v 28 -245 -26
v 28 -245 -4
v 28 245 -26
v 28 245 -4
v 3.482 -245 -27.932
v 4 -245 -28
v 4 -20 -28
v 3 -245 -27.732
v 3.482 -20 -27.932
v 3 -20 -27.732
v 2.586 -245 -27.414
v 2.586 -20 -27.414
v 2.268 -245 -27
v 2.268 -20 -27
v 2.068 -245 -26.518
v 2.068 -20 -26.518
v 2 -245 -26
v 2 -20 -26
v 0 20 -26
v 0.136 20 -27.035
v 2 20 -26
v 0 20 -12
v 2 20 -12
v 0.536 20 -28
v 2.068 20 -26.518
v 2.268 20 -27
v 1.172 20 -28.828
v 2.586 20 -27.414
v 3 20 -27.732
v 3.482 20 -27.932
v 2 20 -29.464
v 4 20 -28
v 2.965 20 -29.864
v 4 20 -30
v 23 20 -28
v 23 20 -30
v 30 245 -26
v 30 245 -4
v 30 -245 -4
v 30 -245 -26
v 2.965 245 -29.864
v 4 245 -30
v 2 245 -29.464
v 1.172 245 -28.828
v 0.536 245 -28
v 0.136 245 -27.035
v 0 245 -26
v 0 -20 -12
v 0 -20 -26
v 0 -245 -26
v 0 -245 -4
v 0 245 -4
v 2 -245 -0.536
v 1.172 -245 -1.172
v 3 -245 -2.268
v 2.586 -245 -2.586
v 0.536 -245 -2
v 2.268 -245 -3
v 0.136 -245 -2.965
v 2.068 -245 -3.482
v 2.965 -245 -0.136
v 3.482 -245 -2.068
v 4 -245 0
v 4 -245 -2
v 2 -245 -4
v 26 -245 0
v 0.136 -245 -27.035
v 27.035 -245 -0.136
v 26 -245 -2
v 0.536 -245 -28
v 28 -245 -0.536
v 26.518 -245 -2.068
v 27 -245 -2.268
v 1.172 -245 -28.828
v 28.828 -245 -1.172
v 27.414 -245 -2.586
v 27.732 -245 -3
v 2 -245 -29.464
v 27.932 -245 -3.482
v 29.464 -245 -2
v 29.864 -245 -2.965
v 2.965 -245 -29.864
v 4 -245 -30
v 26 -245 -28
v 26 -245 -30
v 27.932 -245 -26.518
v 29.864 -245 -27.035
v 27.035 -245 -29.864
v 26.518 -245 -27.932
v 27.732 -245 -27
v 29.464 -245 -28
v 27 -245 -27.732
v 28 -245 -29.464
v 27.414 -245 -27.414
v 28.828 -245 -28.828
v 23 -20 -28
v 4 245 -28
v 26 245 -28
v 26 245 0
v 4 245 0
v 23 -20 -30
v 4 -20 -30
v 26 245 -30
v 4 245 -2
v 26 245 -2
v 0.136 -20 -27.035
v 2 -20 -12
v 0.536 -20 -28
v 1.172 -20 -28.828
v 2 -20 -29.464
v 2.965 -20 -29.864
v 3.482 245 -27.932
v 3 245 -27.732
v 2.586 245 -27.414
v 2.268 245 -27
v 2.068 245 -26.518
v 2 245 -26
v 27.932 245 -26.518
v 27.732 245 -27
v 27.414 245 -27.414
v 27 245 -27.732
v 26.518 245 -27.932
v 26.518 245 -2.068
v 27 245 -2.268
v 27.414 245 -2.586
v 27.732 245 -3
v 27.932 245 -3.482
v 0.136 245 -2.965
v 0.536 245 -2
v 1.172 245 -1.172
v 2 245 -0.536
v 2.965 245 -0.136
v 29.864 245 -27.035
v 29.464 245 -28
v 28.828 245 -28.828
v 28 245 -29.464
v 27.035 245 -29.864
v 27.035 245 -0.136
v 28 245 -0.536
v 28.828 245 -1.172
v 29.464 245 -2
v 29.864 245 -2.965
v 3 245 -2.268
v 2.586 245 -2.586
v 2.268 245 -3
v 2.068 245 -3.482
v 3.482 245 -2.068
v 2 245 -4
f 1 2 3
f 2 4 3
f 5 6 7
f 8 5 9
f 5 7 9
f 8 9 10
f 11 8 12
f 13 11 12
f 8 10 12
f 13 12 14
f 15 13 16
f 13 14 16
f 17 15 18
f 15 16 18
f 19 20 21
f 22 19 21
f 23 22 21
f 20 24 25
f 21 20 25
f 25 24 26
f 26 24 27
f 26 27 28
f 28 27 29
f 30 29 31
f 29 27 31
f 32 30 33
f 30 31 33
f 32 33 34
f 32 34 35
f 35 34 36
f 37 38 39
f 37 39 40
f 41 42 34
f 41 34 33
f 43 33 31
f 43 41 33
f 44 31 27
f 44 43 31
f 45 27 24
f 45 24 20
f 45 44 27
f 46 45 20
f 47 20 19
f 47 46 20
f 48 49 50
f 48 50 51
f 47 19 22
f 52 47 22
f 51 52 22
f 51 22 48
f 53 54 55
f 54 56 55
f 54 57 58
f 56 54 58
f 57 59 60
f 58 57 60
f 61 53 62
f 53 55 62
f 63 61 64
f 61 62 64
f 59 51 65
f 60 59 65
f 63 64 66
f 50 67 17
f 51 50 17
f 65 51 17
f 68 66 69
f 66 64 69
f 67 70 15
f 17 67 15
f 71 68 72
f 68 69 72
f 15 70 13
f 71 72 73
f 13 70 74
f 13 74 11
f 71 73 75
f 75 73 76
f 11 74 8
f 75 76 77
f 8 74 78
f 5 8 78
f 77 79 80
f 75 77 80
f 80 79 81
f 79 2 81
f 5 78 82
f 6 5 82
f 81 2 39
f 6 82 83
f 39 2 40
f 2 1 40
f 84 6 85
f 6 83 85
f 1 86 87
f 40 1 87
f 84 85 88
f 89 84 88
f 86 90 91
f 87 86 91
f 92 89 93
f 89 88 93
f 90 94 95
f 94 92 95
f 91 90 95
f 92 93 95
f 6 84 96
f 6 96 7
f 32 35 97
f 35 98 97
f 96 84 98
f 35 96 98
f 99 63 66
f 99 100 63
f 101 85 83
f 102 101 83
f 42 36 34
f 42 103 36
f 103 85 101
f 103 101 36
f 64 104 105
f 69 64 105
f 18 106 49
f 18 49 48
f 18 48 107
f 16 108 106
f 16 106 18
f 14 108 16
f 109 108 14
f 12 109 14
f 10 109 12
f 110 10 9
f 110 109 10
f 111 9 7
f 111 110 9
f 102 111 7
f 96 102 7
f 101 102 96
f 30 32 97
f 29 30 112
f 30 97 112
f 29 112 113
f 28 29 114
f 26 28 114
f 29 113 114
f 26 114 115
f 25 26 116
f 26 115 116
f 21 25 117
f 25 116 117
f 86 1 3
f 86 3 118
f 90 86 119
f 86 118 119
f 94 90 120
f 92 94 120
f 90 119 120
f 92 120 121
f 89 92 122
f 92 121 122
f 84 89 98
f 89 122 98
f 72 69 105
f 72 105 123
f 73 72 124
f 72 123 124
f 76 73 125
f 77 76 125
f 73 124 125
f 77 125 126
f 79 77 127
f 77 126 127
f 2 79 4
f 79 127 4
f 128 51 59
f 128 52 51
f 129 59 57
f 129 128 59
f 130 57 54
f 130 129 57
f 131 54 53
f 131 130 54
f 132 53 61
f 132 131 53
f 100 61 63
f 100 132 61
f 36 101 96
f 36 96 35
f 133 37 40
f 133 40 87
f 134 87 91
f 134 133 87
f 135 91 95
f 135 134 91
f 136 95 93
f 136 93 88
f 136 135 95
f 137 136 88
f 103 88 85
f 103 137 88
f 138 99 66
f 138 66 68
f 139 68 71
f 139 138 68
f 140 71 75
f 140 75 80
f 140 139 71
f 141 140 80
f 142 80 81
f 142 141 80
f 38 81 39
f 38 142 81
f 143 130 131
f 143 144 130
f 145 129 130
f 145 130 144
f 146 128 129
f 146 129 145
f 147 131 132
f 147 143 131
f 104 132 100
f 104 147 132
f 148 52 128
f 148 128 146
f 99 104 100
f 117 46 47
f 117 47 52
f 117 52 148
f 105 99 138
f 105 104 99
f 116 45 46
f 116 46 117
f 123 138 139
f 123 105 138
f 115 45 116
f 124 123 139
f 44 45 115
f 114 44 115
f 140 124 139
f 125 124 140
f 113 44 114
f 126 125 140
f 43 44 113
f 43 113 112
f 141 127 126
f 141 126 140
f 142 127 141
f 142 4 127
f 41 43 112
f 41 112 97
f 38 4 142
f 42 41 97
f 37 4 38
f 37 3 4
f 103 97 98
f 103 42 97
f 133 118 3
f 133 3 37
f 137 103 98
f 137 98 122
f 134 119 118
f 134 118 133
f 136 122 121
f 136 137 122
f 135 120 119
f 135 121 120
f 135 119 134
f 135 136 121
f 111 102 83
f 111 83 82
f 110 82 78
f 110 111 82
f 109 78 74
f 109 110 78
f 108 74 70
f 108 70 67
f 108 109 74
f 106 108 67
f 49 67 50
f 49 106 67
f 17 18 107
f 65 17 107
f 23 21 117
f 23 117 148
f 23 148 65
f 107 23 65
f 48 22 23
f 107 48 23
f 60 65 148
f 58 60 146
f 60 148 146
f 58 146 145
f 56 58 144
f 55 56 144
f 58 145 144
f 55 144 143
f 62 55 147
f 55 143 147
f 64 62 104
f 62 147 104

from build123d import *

# Parameters (mm, degrees)
EXTRUDE_1_DEPTH     = 245
SKETCH_2_W          = 23
SKETCH_2_H          = 40
CUT_EXTRUDE_1_DEPTH = 18


with BuildPart() as part:
    # 草图1 → 凸台-拉伸1 (new, symmetric)
    with BuildSketch(Plane(origin=(0, 0, 0), x_dir=(1, 0, 0), z_dir=(0, 1, 0))):
        with BuildLine():
            Line((4, 0), (26, 0))
            ThreePointArc((26, 0), (28.828427125, 1.171572875), (30, 4))
            Line((30, 4), (30, 26))
            ThreePointArc((30, 26), (28.828427125, 28.828427125), (26, 30))
            Line((26, 30), (4, 30))
            ThreePointArc((4, 30), (1.171572875, 28.828427125), (0, 26))
            Line((0, 26), (0, 4))
            ThreePointArc((0, 4), (1.171572875, 1.171572875), (4, 0))
        make_face()
        with BuildLine():
            Line((4, 2), (26, 2))
            ThreePointArc((26, 2), (27.414213562, 2.585786438), (28, 4))
            Line((28, 4), (28, 26))
            ThreePointArc((28, 26), (27.414213562, 27.414213562), (26, 28))
            Line((26, 28), (4, 28))
            ThreePointArc((4, 28), (2.585786438, 27.414213562), (2, 26))
            Line((2, 26), (2, 4))
            ThreePointArc((2, 4), (2.585786438, 2.585786438), (4, 2))
        make_face(mode=Mode.SUBTRACT)
    extrude(amount=EXTRUDE_1_DEPTH, both=True)

    # 草图2 → 切除-拉伸1 (cut)
    with BuildSketch(Plane.XY.offset(-30)):
        with Locations((11.5, 0)):
            Rectangle(SKETCH_2_W, SKETCH_2_H)
    extrude(amount=CUT_EXTRUDE_1_DEPTH, mode=Mode.SUBTRACT)


solid = part.part
